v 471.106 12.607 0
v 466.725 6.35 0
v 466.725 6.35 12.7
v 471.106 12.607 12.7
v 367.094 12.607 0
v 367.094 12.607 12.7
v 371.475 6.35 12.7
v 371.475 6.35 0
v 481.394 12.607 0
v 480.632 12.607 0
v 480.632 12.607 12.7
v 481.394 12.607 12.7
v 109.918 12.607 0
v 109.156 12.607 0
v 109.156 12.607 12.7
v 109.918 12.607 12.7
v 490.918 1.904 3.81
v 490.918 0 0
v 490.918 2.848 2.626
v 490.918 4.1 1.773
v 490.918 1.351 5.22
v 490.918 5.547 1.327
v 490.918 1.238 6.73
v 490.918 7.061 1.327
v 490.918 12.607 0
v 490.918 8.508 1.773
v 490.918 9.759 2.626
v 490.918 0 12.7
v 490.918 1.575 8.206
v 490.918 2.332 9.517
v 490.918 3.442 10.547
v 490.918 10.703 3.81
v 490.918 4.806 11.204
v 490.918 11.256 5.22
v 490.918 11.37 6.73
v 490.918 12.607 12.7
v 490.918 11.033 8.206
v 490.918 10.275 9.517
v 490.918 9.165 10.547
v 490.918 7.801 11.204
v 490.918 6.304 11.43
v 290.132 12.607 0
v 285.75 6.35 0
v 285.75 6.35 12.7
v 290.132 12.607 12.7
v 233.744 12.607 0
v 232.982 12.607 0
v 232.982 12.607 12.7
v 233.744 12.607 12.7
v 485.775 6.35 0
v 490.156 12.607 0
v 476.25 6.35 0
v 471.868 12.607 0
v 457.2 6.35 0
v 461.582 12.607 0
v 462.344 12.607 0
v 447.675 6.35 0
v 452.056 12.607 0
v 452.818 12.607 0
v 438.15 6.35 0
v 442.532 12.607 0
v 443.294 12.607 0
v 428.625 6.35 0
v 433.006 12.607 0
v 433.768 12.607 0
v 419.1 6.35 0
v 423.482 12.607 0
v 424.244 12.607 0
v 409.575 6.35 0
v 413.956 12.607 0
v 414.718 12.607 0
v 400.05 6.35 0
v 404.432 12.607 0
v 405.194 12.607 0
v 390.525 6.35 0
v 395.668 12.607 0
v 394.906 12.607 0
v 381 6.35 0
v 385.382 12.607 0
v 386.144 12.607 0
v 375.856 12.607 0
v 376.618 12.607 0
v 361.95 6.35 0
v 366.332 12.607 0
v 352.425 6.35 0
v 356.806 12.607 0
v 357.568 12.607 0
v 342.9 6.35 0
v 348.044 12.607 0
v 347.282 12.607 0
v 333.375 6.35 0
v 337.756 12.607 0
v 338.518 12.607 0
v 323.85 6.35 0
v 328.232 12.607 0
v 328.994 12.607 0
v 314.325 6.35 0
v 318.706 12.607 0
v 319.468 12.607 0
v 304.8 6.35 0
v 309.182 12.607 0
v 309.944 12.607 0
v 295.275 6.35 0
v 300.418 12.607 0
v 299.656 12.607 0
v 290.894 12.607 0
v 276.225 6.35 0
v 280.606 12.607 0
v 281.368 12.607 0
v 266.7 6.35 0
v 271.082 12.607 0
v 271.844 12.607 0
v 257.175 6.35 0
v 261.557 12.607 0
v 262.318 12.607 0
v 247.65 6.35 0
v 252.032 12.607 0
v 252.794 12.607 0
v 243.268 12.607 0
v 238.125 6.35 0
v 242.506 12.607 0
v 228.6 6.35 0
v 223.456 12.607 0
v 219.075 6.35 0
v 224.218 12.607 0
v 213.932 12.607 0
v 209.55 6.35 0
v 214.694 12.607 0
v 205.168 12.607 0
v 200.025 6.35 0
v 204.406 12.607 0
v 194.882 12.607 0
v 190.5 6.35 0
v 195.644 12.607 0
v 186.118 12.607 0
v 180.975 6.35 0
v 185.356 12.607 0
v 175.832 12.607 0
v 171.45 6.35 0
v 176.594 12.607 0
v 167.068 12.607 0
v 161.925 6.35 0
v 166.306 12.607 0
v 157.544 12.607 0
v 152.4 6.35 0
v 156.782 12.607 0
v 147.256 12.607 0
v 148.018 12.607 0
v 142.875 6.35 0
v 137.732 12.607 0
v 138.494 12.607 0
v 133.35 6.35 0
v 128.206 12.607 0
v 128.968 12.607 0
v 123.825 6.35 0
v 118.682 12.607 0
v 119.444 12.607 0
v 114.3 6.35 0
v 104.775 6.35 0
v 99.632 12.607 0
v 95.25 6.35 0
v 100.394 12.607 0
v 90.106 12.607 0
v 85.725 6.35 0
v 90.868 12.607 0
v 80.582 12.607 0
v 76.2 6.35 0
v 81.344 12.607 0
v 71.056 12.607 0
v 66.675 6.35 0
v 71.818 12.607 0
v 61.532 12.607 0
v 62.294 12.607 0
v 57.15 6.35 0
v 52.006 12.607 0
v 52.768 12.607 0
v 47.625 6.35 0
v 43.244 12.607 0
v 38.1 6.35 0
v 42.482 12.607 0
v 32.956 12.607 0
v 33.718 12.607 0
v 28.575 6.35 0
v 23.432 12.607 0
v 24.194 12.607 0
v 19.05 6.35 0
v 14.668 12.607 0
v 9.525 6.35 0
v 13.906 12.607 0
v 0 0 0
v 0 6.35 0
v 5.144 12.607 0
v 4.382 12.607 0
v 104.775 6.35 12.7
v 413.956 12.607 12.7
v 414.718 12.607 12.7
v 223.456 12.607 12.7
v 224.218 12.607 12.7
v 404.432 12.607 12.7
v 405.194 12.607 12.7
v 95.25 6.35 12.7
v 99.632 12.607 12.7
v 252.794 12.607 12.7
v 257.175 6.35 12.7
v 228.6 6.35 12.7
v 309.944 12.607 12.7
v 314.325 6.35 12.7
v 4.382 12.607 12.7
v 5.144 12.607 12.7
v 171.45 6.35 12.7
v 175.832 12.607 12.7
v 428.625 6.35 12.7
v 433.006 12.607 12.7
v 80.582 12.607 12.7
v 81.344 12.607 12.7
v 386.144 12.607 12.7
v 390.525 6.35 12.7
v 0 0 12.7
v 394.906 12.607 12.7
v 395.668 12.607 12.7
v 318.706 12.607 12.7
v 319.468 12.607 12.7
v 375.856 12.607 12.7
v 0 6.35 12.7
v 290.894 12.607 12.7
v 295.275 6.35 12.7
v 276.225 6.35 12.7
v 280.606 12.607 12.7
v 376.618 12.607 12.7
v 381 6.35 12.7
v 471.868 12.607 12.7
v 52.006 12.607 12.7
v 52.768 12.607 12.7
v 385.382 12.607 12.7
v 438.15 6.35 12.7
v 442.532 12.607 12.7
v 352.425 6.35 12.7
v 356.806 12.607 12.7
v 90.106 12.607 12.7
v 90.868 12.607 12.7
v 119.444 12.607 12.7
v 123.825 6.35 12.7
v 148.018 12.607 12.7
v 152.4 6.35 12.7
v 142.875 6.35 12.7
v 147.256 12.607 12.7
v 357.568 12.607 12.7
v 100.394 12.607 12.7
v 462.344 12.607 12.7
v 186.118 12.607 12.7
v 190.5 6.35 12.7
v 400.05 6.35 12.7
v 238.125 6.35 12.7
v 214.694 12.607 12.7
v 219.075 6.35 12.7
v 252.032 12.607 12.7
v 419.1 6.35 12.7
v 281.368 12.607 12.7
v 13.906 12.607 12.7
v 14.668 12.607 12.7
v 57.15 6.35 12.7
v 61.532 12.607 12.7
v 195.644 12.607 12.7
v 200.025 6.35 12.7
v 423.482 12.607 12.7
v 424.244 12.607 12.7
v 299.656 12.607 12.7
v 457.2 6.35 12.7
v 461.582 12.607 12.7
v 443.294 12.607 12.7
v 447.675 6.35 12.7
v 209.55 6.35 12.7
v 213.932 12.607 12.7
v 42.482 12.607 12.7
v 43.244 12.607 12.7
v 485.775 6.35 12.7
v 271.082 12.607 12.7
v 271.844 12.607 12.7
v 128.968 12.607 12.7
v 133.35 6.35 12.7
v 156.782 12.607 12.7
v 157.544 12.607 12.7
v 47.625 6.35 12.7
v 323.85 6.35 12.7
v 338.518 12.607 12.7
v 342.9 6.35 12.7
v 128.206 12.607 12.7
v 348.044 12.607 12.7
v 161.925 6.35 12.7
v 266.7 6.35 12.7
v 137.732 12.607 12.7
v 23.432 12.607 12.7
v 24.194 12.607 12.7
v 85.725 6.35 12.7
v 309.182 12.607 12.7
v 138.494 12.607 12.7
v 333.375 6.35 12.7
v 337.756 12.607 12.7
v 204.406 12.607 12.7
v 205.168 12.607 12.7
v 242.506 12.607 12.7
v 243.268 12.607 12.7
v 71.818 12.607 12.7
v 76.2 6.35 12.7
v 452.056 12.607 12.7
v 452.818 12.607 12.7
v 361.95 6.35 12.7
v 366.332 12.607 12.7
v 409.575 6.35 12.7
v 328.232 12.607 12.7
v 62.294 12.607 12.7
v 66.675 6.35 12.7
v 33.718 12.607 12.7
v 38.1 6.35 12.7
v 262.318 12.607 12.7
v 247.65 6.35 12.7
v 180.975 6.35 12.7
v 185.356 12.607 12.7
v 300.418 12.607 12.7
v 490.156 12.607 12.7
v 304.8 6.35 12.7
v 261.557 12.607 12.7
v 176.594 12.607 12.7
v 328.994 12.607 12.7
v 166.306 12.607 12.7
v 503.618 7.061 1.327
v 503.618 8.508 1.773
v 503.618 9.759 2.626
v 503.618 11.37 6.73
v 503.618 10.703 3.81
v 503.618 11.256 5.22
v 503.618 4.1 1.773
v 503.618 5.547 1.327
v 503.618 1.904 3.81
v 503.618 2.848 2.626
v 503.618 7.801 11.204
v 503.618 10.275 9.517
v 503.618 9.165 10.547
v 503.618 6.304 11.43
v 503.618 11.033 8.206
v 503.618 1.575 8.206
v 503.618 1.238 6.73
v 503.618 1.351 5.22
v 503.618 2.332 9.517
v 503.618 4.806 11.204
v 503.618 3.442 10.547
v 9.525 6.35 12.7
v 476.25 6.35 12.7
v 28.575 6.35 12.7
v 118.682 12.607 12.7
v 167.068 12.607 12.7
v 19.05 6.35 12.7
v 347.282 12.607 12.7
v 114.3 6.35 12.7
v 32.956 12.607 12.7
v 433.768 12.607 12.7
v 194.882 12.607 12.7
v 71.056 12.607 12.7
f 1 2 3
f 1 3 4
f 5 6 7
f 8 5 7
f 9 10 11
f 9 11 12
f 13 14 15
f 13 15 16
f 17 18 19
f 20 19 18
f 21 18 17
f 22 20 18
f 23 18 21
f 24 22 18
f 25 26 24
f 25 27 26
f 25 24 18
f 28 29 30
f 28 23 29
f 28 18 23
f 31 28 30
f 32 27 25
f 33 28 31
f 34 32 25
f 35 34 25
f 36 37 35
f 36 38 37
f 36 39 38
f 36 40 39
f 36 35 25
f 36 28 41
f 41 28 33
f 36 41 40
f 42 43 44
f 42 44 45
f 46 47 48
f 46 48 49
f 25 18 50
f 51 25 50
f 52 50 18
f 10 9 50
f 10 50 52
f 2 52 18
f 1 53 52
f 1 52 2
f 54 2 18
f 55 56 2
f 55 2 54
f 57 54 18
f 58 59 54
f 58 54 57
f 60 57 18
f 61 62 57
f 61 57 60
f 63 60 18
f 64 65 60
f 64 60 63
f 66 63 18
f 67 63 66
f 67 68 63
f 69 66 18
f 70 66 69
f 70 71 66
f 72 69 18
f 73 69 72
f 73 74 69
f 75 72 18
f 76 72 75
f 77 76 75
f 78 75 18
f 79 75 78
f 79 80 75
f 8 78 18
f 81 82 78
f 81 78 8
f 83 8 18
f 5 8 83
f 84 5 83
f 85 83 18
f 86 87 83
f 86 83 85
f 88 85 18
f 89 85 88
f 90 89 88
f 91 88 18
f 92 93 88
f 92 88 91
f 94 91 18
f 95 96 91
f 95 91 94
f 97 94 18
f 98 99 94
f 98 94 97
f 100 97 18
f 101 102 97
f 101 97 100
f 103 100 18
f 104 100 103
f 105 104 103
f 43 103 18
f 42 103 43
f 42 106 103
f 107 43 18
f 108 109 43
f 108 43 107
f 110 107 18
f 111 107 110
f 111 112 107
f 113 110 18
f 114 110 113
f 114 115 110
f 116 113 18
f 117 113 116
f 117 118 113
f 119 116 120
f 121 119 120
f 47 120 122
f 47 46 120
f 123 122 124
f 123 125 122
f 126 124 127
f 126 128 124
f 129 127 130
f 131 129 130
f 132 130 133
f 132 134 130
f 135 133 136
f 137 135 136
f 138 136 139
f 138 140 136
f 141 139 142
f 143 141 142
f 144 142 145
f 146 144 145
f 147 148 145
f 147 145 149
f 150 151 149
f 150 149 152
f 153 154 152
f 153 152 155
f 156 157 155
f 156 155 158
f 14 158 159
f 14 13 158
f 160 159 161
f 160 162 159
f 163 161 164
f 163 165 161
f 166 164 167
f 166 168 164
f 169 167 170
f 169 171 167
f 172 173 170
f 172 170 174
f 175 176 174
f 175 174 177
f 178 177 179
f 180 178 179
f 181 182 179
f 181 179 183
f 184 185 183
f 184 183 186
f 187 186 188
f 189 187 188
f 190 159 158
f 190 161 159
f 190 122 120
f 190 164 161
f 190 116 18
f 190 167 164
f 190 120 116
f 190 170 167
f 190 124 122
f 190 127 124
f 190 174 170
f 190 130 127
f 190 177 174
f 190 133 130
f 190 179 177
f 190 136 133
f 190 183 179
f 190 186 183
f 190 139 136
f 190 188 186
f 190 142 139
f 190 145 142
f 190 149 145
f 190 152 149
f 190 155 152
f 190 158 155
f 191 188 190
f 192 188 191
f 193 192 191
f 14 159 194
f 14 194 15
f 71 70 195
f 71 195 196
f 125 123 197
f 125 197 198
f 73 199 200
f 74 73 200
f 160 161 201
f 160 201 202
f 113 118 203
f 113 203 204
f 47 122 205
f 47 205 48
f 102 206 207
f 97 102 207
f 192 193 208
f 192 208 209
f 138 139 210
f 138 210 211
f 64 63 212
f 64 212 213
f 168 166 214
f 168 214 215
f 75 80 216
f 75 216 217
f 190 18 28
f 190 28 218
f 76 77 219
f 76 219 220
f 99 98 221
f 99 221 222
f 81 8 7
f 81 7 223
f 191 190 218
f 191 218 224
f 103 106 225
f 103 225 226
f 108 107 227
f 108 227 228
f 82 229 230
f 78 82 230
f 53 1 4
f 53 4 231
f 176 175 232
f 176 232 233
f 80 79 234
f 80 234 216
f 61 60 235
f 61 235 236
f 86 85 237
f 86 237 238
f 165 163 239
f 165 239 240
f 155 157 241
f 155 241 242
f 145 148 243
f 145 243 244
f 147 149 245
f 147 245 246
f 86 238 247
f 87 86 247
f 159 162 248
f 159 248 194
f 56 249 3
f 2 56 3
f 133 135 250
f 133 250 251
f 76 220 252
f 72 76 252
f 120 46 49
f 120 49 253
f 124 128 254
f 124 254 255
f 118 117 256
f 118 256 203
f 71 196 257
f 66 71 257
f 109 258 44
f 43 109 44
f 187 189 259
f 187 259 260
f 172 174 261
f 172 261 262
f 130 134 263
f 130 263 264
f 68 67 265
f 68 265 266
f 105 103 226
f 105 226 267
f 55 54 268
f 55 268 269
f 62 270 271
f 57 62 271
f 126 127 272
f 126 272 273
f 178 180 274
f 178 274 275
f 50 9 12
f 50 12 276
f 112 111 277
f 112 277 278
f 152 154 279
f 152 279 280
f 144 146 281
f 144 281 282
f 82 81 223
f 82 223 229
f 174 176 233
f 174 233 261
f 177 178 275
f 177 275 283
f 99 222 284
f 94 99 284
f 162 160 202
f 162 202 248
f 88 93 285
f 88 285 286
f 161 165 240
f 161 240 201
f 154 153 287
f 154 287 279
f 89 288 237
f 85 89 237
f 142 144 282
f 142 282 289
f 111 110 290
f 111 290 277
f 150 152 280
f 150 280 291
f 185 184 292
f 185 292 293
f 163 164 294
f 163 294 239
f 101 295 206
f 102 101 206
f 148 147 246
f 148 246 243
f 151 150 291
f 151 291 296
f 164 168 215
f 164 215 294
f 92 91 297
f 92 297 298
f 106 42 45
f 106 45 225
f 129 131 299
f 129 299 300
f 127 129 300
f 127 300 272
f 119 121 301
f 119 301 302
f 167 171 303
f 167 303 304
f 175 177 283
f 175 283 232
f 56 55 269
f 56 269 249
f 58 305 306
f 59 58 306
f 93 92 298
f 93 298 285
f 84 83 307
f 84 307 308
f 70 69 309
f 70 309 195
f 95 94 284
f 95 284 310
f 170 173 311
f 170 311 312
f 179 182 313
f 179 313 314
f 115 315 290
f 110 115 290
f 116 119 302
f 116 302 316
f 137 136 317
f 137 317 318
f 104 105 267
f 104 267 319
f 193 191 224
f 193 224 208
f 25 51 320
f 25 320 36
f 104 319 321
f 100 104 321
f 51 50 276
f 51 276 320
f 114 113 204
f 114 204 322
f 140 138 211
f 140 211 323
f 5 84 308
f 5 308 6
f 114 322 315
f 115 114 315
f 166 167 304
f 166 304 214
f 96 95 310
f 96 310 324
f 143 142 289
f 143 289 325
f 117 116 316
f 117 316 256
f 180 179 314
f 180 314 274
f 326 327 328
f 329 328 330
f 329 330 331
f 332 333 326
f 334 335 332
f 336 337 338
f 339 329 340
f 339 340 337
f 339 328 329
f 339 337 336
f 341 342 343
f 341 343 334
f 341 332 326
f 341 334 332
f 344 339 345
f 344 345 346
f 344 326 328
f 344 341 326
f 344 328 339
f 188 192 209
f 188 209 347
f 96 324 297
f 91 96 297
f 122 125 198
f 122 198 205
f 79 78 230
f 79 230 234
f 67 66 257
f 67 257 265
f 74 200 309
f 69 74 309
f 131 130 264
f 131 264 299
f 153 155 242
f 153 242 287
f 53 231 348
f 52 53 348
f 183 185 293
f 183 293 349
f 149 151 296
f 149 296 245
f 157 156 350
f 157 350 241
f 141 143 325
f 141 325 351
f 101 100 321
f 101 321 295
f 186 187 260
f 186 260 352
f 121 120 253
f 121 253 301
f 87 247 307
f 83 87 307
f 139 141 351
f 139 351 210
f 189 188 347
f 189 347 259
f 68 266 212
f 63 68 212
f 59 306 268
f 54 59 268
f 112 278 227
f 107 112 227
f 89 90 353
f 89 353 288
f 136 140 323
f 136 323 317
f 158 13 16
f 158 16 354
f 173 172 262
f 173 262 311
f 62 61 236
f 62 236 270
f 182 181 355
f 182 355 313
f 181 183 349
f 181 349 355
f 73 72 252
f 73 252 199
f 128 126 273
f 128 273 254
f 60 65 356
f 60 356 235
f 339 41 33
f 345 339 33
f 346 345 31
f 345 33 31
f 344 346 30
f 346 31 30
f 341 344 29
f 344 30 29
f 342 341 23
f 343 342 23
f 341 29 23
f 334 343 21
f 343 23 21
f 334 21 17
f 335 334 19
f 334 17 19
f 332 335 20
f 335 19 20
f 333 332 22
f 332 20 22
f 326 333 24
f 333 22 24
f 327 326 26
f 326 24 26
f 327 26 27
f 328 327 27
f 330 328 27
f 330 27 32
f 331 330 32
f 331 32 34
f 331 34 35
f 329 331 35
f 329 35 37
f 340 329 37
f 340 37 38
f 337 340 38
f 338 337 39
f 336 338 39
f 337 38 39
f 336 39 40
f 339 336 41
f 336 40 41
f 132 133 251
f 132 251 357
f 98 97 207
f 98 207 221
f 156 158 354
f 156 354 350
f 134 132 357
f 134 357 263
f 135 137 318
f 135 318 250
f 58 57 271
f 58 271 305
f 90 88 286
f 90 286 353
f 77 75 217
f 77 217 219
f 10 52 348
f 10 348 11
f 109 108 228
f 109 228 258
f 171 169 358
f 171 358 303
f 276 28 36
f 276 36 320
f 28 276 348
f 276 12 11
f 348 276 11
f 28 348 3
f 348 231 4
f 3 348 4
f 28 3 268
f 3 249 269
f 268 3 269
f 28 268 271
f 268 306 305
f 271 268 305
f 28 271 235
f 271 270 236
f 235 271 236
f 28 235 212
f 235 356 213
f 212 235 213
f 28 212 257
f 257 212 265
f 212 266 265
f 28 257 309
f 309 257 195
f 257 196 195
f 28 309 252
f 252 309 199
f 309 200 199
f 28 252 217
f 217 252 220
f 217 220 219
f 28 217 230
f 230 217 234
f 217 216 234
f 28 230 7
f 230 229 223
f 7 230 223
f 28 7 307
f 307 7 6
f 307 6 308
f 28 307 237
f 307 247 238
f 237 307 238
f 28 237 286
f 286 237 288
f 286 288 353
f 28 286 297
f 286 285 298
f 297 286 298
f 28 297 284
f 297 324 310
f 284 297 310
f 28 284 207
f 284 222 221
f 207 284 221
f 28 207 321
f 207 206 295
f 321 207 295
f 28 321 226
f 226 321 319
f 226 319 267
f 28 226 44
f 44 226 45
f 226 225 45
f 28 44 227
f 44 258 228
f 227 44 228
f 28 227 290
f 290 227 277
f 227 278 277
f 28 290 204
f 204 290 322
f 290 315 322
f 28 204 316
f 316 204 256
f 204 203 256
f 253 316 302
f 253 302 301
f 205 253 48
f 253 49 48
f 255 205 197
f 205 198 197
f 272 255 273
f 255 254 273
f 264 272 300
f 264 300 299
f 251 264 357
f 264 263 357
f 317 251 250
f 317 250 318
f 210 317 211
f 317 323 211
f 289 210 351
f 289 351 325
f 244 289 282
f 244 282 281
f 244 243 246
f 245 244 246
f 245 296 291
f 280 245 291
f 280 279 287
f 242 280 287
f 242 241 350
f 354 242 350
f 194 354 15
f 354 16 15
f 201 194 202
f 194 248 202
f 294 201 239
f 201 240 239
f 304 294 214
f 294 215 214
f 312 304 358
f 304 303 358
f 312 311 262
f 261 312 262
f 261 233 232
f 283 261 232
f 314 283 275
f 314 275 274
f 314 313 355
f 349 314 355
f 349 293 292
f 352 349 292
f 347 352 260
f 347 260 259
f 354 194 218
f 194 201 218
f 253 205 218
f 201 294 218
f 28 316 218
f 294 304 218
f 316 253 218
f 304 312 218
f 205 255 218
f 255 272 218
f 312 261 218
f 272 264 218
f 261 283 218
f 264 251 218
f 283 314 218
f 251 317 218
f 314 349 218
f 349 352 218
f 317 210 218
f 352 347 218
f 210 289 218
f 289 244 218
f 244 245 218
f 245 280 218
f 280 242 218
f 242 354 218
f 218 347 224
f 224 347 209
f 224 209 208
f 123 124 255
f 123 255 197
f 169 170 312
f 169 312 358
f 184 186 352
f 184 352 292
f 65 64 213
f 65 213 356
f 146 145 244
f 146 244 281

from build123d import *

# Parameters (mm, degrees)
BOSS_EXTRUDE1_DEPTH = 12.7
SKETCH2_W           = 4.3815
SKETCH2_H           = 12.607430492
CUT_EXTRUDE1_DEPTH  = 496.623170669
SKETCH3_R           = 5.08
BOSS_EXTRUDE2_DEPTH = 12.7


with BuildPart() as part:
    # Sketch1 → Boss-Extrude1 (new body)
    with BuildSketch(Plane.XY):
        Polygon((0, 0), (0, 6.35), (4.3815, 12.607430492), (5.1435, 12.607430492), (9.525, 6.35), (13.9065, 12.607430492), (14.6685, 12.607430492), (19.05, 6.35), (23.4315, 12.607430492), (24.1935, 12.607430492), (28.575, 6.35), (32.9565, 12.607430492), (33.7185, 12.607430492), (38.1, 6.35), (42.4815, 12.607430492), (43.2435, 12.607430492), (47.625, 6.35), (52.0065, 12.607430492), (52.7685, 12.607430492), (57.15, 6.35), (61.5315, 12.607430492), (62.2935, 12.607430492), (66.675, 6.35), (71.0565, 12.607430492), (71.8185, 12.607430492), (76.2, 6.35), (80.5815, 12.607430492), (81.3435, 12.607430492), (85.725, 6.35), (90.1065, 12.607430492), (90.8685, 12.607430492), (95.25, 6.35), (99.6315, 12.607430492), (100.3935, 12.607430492), (104.775, 6.35), (109.1565, 12.607430492), (109.9185, 12.607430492), (114.3, 6.35), (118.6815, 12.607430492), (119.4435, 12.607430492), (123.825, 6.35), (128.2065, 12.607430492), (128.9685, 12.607430492), (133.35, 6.35), (137.7315, 12.607430492), (138.4935, 12.607430492), (142.875, 6.35), (147.2565, 12.607430492), (148.0185, 12.607430492), (152.4, 6.35), (156.7815, 12.607430492), (157.5435, 12.607430492), (161.925, 6.35), (166.3065, 12.607430492), (167.0685, 12.607430492), (171.45, 6.35), (175.8315, 12.607430492), (176.5935, 12.607430492), (180.975, 6.35), (185.3565, 12.607430492), (186.1185, 12.607430492), (190.5, 6.35), (194.8815, 12.607430492), (195.6435, 12.607430492), (200.025, 6.35), (204.4065, 12.607430492), (205.1685, 12.607430492), (209.55, 6.35), (213.9315, 12.607430492), (214.6935, 12.607430492), (219.075, 6.35), (223.4565, 12.607430492), (224.2185, 12.607430492), (228.6, 6.35), (232.9815, 12.607430492), (233.7435, 12.607430492), (238.125, 6.35), (242.5065, 12.607430492), (243.2685, 12.607430492), (247.65, 6.35), (252.0315, 12.607430492), (252.7935, 12.607430492), (257.175, 6.35), (261.5565, 12.607430492), (262.3185, 12.607430492), (266.7, 6.35), (271.0815, 12.607430492), (271.8435, 12.607430492), (276.225, 6.35), (280.6065, 12.607430492), (281.3685, 12.607430492), (285.75, 6.35), (290.1315, 12.607430492), (290.8935, 12.607430492), (295.275, 6.35), (299.6565, 12.607430492), (300.4185, 12.607430492), (304.8, 6.35), (309.1815, 12.607430492), (309.9435, 12.607430492), (314.325, 6.35), (318.7065, 12.607430492), (319.4685, 12.607430492), (323.85, 6.35), (328.2315, 12.607430492), (328.9935, 12.607430492), (333.375, 6.35), (337.7565, 12.607430492), (338.5185, 12.607430492), (342.9, 6.35), (347.2815, 12.607430492), (348.0435, 12.607430492), (352.425, 6.35), (356.8065, 12.607430492), (357.5685, 12.607430492), (361.95, 6.35), (366.3315, 12.607430492), (367.0935, 12.607430492), (371.475, 6.35), (375.8565, 12.607430492), (376.6185, 12.607430492), (381, 6.35), (385.3815, 12.607430492), (386.1435, 12.607430492), (390.525, 6.35), (394.9065, 12.607430492), (395.6685, 12.607430492), (400.05, 6.35), (404.4315, 12.607430492), (405.1935, 12.607430492), (409.575, 6.35), (413.9565, 12.607430492), (414.7185, 12.607430492), (419.1, 6.35), (423.4815, 12.607430492), (424.2435, 12.607430492), (428.625, 6.35), (433.0065, 12.607430492), (433.7685, 12.607430492), (438.15, 6.35), (442.5315, 12.607430492), (443.2935, 12.607430492), (447.675, 6.35), (452.0565, 12.607430492), (452.8185, 12.607430492), (457.2, 6.35), (461.5815, 12.607430492), (462.3435, 12.607430492), (466.725, 6.35), (471.1065, 12.607430492), (471.8685, 12.607430492), (476.25, 6.35), (480.6315, 12.607430492), (481.3935, 12.607430492), (485.775, 6.35), (490.1565, 12.607430492), (490.9185, 12.607430492), (495.3, 6.35), (495.3, 0), align=None)
    extrude(amount=BOSS_EXTRUDE1_DEPTH)

    # Sketch2 → Cut-Extrude1 (cut, through all)
    with BuildSketch(Plane.XY.offset(12.7)):
        with Locations((493.10925, 6.303715246)):
            Rectangle(SKETCH2_W, SKETCH2_H)
    extrude(amount=-CUT_EXTRUDE1_DEPTH, mode=Mode.SUBTRACT)

    # Sketch3 → Boss-Extrude2 (add)
    with BuildSketch(Plane(origin=(490.9185, 0, 0), x_dir=(0, 0, -1), z_dir=(1, 0, 0))):
        with Locations(Location((-6.35, 6.303715246, 0), (0, 0, 180))):
            Circle(SKETCH3_R)
    extrude(amount=BOSS_EXTRUDE2_DEPTH)


solid = part.part
